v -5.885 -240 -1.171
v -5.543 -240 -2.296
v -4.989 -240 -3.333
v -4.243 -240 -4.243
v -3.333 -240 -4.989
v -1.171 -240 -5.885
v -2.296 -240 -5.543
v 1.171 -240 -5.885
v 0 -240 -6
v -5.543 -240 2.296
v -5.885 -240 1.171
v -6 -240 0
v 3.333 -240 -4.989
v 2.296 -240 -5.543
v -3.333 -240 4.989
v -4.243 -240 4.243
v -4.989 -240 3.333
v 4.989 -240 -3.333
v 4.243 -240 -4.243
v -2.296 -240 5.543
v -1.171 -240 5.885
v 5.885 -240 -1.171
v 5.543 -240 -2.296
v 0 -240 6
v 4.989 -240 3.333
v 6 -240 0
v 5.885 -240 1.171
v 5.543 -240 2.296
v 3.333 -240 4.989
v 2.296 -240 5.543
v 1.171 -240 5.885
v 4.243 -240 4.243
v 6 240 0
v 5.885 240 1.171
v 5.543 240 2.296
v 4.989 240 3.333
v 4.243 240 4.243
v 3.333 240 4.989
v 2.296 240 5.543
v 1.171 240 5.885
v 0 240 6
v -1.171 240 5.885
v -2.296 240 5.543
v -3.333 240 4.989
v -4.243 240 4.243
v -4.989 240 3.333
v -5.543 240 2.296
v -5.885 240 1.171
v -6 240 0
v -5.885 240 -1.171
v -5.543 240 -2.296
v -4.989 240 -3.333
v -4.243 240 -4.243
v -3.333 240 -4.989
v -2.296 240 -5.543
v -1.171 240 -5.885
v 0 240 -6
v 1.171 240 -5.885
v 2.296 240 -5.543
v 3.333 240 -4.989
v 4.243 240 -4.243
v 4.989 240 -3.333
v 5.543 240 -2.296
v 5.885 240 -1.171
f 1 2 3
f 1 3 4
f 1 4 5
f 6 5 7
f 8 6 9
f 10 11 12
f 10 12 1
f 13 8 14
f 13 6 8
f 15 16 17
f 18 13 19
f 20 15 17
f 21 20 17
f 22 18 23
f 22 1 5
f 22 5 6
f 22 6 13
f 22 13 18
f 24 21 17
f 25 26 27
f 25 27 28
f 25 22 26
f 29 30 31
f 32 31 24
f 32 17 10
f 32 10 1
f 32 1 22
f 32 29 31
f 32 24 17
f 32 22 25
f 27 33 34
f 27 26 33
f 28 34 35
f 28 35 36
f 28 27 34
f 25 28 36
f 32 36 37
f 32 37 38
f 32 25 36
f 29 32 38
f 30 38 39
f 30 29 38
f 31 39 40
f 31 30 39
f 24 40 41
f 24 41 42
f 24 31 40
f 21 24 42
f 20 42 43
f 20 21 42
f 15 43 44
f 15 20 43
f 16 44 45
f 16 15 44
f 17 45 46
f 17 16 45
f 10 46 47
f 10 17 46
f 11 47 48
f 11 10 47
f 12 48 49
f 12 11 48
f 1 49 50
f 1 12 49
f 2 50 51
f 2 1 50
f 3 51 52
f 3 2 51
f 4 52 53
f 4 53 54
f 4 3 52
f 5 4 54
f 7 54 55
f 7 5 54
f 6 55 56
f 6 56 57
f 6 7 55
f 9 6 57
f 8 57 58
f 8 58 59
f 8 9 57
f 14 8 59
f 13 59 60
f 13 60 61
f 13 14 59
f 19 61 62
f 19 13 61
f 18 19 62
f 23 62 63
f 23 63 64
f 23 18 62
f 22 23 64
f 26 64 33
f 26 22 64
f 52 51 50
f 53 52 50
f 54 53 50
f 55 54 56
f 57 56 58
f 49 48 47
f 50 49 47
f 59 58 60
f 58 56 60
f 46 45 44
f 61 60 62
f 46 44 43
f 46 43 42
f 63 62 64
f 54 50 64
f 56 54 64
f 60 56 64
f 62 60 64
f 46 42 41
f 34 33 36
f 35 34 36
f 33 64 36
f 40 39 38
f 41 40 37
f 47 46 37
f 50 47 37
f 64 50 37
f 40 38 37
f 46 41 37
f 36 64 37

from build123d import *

# Parameters (mm, degrees)
F1_R     = 6
F2_DEPTH = 240


with BuildPart() as f2:
    # F1 (on Front) → F2 (new body, symmetric)
    with BuildSketch(Plane.XZ):
        Circle(F1_R)
    extrude(amount=F2_DEPTH, both=True)


with BuildPart() as f3_1:
    # F3: copy of F2
    add(f2.part)


solid = f2.part
